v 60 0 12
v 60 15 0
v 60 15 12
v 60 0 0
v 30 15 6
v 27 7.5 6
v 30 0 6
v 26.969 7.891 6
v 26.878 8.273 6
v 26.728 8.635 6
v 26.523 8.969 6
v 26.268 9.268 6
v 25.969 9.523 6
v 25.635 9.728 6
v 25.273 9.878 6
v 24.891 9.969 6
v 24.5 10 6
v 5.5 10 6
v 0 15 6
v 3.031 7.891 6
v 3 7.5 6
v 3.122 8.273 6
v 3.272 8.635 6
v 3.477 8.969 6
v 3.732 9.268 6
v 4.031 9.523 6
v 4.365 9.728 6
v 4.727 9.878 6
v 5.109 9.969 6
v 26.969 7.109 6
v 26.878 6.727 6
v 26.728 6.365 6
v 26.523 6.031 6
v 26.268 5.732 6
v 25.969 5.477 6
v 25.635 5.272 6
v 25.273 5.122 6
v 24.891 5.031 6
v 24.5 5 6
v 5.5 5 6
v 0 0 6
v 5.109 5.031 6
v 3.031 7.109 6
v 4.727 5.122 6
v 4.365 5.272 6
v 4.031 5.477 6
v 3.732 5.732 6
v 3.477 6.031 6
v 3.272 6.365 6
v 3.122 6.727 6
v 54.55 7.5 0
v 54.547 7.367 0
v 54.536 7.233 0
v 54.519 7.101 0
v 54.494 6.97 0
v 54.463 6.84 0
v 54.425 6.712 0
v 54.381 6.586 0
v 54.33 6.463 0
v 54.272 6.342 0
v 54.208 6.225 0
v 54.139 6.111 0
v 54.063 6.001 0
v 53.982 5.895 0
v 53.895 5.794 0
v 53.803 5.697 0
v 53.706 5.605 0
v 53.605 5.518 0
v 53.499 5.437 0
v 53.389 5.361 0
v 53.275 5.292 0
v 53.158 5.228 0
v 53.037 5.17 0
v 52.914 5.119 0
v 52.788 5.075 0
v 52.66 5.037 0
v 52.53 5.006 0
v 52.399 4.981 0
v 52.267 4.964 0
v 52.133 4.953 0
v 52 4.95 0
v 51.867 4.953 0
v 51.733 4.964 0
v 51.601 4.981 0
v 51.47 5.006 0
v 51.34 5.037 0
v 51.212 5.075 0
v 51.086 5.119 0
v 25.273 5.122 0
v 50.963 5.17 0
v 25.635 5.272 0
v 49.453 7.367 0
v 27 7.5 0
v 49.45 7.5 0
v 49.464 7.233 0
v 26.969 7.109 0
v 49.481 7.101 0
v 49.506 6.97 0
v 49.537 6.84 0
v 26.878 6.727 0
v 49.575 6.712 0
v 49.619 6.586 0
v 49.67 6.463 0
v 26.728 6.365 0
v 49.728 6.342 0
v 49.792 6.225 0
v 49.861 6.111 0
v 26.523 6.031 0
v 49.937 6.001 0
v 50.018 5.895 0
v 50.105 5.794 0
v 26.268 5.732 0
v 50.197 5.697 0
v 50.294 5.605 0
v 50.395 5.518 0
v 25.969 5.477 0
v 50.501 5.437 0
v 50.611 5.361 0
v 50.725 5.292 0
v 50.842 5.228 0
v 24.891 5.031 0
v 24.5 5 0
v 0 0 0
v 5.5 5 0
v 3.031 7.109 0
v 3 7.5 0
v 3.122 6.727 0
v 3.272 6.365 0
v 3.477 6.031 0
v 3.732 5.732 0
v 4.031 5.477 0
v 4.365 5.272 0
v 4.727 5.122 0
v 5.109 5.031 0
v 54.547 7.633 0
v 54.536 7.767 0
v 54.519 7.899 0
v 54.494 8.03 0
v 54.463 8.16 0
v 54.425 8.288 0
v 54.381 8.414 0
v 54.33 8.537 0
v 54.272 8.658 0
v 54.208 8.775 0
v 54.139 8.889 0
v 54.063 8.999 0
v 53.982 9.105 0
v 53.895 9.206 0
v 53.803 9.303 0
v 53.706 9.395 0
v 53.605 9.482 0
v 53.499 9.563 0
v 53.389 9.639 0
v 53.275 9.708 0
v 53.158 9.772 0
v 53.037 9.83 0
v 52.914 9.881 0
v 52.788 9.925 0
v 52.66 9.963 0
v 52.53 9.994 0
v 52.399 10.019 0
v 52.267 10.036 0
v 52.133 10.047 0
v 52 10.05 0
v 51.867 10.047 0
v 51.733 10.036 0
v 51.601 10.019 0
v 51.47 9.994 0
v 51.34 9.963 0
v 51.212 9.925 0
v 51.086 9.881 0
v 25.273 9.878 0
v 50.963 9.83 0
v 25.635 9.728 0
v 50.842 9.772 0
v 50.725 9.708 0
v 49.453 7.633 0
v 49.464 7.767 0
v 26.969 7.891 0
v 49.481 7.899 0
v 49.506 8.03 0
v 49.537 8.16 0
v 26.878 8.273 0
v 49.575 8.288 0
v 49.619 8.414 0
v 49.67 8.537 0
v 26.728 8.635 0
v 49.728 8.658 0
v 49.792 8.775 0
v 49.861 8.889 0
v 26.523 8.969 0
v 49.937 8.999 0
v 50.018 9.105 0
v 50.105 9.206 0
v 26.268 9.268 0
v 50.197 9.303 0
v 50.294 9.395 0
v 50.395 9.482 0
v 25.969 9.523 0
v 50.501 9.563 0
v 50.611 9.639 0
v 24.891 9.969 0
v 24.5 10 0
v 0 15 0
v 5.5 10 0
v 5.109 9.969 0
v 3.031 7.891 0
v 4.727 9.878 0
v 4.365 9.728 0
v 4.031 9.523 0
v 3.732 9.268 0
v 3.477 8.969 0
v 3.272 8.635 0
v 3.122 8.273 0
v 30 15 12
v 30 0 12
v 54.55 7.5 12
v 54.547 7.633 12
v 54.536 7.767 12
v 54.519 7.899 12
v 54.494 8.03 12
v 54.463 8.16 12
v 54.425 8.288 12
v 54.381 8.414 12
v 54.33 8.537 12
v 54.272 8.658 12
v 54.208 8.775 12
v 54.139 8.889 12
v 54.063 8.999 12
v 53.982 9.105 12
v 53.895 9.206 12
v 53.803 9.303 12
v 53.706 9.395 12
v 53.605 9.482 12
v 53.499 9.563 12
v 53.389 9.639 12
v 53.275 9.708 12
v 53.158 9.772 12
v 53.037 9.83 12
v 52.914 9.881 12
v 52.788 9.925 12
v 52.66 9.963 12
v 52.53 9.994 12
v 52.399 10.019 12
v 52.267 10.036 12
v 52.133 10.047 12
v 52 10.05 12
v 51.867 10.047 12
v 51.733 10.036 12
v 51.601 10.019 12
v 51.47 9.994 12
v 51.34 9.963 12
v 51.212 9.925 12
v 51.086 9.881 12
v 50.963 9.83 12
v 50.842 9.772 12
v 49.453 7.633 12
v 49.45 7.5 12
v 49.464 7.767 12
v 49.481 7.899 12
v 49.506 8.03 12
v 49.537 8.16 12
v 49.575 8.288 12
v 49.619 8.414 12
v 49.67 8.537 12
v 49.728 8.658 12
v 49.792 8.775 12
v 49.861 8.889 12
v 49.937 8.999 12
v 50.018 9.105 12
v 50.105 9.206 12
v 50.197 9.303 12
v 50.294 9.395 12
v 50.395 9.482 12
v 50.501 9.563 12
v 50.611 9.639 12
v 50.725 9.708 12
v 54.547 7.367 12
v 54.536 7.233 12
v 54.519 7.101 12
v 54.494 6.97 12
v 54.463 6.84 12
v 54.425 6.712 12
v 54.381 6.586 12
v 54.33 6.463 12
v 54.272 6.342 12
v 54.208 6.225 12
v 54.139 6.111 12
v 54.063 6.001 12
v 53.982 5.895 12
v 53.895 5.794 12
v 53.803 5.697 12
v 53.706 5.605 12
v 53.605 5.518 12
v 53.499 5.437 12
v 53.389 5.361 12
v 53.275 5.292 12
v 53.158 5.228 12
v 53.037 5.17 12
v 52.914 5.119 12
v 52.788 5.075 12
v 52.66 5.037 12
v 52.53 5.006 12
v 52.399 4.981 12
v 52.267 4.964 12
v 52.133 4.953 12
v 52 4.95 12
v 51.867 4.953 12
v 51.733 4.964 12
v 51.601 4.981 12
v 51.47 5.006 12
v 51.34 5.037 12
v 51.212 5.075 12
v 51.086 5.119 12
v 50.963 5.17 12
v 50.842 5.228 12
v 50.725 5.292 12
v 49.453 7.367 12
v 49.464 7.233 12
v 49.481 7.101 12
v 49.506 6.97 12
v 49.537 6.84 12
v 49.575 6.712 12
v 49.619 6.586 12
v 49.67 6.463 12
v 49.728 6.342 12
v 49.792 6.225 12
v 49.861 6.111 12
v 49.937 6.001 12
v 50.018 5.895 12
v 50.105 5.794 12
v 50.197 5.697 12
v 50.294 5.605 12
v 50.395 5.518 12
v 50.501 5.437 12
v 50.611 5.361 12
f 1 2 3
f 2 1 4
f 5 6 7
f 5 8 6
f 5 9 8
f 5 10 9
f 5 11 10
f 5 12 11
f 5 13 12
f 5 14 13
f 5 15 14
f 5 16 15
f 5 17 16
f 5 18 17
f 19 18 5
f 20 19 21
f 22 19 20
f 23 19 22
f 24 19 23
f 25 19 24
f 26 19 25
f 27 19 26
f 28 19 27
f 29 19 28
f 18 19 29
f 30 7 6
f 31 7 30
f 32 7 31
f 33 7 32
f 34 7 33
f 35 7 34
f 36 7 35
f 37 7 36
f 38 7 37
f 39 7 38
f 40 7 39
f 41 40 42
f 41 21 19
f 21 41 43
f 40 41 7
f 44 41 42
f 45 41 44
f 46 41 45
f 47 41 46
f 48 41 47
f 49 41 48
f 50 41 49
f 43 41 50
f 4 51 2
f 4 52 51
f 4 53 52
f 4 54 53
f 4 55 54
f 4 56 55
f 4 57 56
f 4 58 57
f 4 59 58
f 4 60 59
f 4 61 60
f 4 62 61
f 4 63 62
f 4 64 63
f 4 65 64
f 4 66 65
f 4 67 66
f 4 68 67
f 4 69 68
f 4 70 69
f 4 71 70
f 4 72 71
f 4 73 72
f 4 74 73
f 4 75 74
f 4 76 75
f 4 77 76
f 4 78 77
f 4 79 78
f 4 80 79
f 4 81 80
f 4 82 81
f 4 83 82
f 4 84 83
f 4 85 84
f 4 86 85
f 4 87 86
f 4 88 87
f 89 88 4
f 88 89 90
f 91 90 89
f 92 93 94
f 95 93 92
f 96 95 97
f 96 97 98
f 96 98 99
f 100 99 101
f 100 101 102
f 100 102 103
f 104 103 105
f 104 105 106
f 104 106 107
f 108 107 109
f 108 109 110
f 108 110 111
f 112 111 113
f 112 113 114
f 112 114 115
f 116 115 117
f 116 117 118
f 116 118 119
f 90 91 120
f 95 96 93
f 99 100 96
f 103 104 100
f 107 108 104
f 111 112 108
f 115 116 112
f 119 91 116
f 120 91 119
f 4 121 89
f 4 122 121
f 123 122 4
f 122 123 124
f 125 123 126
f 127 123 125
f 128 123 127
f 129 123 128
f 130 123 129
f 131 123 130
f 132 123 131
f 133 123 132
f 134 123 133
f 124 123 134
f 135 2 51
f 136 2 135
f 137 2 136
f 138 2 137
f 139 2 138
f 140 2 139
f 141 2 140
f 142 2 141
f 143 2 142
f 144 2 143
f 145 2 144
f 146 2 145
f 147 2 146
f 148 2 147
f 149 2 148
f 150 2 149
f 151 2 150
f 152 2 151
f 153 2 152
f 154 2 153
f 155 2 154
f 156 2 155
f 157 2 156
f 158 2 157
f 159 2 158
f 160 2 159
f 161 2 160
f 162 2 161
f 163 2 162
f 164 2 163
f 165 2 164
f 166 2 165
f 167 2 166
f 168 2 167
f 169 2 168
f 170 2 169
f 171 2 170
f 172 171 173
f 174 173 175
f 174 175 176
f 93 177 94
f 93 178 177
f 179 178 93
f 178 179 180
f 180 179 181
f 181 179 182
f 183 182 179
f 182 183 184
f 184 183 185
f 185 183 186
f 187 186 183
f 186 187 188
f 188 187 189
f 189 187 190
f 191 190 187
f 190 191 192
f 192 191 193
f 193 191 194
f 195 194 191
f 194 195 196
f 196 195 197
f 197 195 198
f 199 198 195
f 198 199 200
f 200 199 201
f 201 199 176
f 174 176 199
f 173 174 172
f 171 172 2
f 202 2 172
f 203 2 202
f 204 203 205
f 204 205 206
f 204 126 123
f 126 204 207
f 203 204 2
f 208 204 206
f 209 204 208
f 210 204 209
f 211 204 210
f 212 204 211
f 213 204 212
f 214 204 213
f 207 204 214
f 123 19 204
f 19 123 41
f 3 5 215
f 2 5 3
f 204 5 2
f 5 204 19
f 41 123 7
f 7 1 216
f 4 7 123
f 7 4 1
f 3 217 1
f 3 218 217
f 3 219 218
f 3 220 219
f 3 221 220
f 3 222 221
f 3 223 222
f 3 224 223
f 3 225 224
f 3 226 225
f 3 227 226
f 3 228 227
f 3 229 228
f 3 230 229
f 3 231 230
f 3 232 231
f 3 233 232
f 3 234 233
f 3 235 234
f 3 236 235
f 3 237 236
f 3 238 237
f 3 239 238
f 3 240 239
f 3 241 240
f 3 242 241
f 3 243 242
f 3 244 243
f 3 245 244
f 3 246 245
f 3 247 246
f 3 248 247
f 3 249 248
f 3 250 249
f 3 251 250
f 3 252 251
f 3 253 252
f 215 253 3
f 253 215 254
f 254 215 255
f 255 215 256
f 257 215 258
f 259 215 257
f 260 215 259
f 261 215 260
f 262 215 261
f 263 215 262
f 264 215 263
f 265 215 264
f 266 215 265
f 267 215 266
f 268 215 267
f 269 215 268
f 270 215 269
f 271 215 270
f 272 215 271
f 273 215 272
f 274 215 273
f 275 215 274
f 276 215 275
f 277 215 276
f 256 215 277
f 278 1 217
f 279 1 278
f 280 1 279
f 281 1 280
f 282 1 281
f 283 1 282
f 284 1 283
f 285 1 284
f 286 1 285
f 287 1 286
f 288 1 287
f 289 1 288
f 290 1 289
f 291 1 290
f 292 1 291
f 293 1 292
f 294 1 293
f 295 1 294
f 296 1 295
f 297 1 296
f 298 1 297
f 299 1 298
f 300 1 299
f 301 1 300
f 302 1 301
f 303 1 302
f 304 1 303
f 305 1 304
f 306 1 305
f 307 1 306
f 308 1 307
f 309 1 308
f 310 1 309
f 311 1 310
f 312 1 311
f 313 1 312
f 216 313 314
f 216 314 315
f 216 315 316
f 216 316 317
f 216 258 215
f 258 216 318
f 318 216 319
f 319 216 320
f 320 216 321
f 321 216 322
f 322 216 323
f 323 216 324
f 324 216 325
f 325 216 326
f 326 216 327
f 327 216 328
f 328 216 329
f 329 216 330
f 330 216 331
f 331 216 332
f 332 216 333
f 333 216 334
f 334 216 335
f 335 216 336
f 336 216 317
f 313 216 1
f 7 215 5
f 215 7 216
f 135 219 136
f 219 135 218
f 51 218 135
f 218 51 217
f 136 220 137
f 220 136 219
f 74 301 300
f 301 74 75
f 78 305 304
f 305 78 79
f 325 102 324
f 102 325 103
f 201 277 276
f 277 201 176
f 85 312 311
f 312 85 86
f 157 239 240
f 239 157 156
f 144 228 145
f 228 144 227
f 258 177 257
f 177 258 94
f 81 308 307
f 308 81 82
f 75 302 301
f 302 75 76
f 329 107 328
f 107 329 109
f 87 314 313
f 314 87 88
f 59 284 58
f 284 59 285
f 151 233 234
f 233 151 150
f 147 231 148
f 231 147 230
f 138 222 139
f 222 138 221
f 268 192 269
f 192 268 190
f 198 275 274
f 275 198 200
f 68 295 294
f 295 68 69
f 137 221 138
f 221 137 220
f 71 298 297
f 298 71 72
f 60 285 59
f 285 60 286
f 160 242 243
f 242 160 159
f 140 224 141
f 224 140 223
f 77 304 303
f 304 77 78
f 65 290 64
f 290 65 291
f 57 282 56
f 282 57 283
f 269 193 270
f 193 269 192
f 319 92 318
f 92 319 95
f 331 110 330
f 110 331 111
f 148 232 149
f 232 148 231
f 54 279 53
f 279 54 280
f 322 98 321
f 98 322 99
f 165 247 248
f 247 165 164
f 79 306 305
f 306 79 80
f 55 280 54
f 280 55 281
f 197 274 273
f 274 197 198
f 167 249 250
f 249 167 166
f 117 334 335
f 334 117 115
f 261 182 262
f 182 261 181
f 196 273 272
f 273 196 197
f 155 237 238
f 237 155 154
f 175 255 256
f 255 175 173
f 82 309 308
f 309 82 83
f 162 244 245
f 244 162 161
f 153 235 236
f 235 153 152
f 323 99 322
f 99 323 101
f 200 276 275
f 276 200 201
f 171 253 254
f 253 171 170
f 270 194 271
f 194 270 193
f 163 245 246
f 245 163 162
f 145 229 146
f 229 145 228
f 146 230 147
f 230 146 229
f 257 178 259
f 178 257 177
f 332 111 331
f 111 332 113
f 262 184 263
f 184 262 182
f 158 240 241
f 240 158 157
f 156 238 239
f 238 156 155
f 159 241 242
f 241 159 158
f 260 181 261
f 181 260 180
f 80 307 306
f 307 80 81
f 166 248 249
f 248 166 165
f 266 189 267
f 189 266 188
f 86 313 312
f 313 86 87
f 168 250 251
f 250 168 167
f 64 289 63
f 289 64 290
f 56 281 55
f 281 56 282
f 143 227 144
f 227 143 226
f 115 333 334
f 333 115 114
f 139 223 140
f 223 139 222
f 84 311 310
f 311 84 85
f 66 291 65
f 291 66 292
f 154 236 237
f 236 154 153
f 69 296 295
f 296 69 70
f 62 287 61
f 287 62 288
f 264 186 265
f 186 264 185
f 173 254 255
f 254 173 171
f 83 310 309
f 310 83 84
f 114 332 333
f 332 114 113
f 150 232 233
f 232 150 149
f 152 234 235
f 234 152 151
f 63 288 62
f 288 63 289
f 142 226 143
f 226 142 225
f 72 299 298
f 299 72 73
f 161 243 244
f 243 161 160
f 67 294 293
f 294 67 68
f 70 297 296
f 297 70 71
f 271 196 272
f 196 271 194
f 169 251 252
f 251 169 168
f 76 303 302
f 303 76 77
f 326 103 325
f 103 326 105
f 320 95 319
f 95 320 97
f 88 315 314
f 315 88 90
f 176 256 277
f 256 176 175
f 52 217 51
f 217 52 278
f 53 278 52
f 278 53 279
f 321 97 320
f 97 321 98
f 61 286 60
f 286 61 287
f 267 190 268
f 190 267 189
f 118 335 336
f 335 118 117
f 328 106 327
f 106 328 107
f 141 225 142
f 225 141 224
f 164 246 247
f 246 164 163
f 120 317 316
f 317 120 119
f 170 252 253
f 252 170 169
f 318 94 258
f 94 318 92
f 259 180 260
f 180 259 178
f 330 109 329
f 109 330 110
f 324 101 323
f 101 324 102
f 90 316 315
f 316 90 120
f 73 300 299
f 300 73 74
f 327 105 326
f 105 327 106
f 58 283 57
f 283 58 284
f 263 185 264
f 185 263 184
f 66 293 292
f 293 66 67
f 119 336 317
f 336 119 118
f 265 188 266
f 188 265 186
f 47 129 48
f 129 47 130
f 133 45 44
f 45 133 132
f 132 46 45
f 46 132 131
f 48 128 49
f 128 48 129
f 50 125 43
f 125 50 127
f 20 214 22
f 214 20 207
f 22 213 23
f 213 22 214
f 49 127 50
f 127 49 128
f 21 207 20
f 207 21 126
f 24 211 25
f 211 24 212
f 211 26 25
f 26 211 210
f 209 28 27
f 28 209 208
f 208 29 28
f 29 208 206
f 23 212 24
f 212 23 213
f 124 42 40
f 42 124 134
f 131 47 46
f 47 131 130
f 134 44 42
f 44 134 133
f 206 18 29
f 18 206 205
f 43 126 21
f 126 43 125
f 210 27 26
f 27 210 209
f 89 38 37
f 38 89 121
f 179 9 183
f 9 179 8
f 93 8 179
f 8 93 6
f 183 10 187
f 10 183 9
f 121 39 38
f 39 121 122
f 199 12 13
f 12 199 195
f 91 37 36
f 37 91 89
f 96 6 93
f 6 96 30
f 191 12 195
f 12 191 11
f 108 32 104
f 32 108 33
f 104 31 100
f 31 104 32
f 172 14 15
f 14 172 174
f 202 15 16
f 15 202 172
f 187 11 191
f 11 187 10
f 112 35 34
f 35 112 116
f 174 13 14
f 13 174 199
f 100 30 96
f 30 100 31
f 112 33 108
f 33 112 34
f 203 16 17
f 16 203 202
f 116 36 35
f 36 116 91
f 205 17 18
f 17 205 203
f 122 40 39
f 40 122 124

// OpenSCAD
//This is an openscad part used as a pulley to connect to the shaft

//render
//lower_flange();
//translate([-h_lip-h_body/2,0,d_shaft+2*t_hub])
//rotate([0,90,0])
//idler_pulley();

tensioner();

//===========Parameters===========

num_frames = 12; //total number of frames to make cutouts for
panel_width = 1.625*25.4;  //size of each panel

//===========Geometry============
clearance = 0.1; //mm - amount to oversize holes so that parts will assemble

d_shaft = .75*25.4; //0.75" shaft diameter in mm
d_mag = 8.1; //  diamete of magnets in mm
h_mag = 2.1; //mm the heigh of the magnets
d_pin = 0.125*25.4; // diameter of pins used to hold shaft to flange
d_flange = 7*25.4; // outer diameter of the flange 
t_flange = 6; //thickness of the flang in mm
t_hub = 6; //thickness of the material around the hub
h_hub = 25; //height of the hub from the surface of the flange
edge_space = 5; //mm from the edge of the flange to the closest part of the frame
d_base = d_shaft+2*t_hub+6;
t_base = 3; //mm thickness of base web
t_panel = 3;//mm how thick each panel is
panel_cut = 3; //mm how deep of a recess to cut for each panel

h_lip = 1.45; //mm height of the lip that keeps the belt in place
h_body = 3.7; //mm height of the body area the belt rides on

t_lip = 0.75; //mm diamater of lip above body
d_cut = 3.2; //mm diameter in bore size 

inner_clear = 10; //mm space between arms
t_arm = 6; //mm thickness of each arm
h_arm = 40; //mm length of each arm
t_base = 8; //mm thickness of the base
depth = 20; //mm how deep the assembly is

ten_width = 15; //mm how wide the tensioner is
bh_width = 5; //mm how wide to make the screw hole
bh_len = 30; //mm how long the bolt holder section should be
ten_dist = 22; //mm distance from the edge of the board to center of shaft
d_spindle = 4.5; //mm diameter of the spindle shaft
extra_len = 8; //mm distance from center of shaft to end of block
h_wood = 6; // mm - thickness of wood
h_block = 6; // mm - thickness of bolt holddown
len_total = bh_len + ten_dist+extra_len;
bh_edge = 3; //mm clearance for bolt hole to edge

fudge = 0.01; //mm - use this value to make sure surfaces aren't coincident
//===========Modules=============
module lower_flange(){
    difference(){
        //Make the core of the flange
        union(){
            //This makes the base of the flange
            //cylinder(r = d_flange/2, h= t_flange, $fn = 360);
            //This makes the hub
            //translate([0,0,t_flange-fudge])
            cylinder(r=d_base,h=t_base,$fn = 120);
            cylinder(r = d_shaft/2+t_hub, h = h_hub+t_flange, $fn = 120);
            //add in a block to mate the disks
            translate([-49/2,-10.1/2,0])
            cube([49,10.1,6+t_base]);
        }
        //Then subtract things from it
        
        //Subtract the hole for the shaft
        translate([0,0,-fudge])
        cylinder(r = d_shaft/2+clearance,h = t_flange+h_hub+2*fudge,$fn = 120);
        
        //cut a pin to register the flange to the shaft
               
        translate([0,0,t_flange+h_hub*.5])
        rotate([90,0,0]) 
        cylinder(r=d_pin/2,h=5*d_shaft+2*t_hub+2*fudge,$fn=20,center=true);
        //subtract the holes for the frames
        for (i=[0:num_frames-1]){
            cord_calc(i);
            mag_holes(i);
            
            
        }
        
 
    }
    
  
    
    
    
    
}
module cord_calc(i){
    theta = 2*3.1415/num_frames;
    r_panel = (d_flange/2-edge_space)*cos(theta/2)-t_panel;
 
    rotate([0,0,i*theta*180/3.1415])
    translate([r_panel,-panel_width/2,t_flange+fudge-panel_cut])
    cube([t_panel+clearance,panel_width+clearance,panel_cut]);
  
}

module mag_holes(i){
    theta = 2*3.1415/num_frames;
    
    rotate([0,0,i*theta*180/3.1415])
    translate([d_flange/2-d_mag/2-edge_space,0,-fudge])
    cylinder(r=d_mag/2+clearance, h=h_mag, $fn = 20);
    
}
module idler_pulley(){
    difference(){
        union(){
        //create the surface of the pulley that the belt rides on
        translate([0,0,h_lip])
        cylinder(r = d_shaft/2+t_hub, h = h_body, $fn = 120);
        //lower lip
        cylinder(r = d_shaft/2+t_hub+t_lip, h = h_lip+fudge, $fn = 120);
        //upper lip
        translate([0,0,h_lip+h_body-fudge])
        cylinder(r = d_shaft/2+t_hub+t_lip, h = h_lip+fudge, $fn = 120);        
    }
        //subtract out center hole
        translate([0,0,-fudge])
        cylinder(r = d_cut/2, h = h_body+2*h_lip+2*fudge,$fn=120);
    
    }
}

module bracket(){
    difference(){
        union(){
            //create the base
            translate([-inner_clear/2,-depth/2,0])
            cube([inner_clear,depth,t_base]);
            //right arm
            translate([inner_clear/2,-depth/2,0])
            cube([t_arm,depth,h_arm]);
            //left arme
            translate([-inner_clear/2-t_arm,-depth/2,0])
            cube([t_arm,depth,h_arm]);        
    }
        //subtract out center hole
        translate([-50,0,d_shaft+2*t_hub])
        rotate([0,90,0])
        cylinder(r = d_cut/2, h = 100,$fn=120);
    
        //subtract out mounting hole
        translate([0,0,-fudge])
        cylinder(r = d_cut/2,h = 100, $fn = 40);
    
    }
    
    
    
}

module tensioner(){
    difference(){
        union(){
            //create the holddown that sets the sizes
            cube([len_total,ten_width,h_block]);
            //add the portion that will mirror the thickness of the wood
            translate([bh_len,0,h_block])
            cube([ten_dist+extra_len,ten_width,h_wood]);    
    }
        //subtract out shaft hole
        translate([bh_len+ten_dist,ten_width/2,-2*h_wood])
        cylinder(r = d_spindle/2+3*clearance, h = 10*h_wood,$fn=120);
    
        //subtract out mounting slot
        //put cylinders on both ends
        //put a box in the center
        translate([bh_width/2+bh_edge,ten_width/2,-2*h_wood])
        cylinder(r = bh_width/2,h = 10*h_wood, $fn = 40);
        //second cylinder
        translate([bh_len-bh_width/2-bh_edge,ten_width/2,-2*h_wood])
        cylinder(r = bh_width/2,h = 10*h_wood, $fn = 40);
        //box
        translate([bh_width/2+bh_edge,ten_width/2-bh_width/2,-2*h_wood])
        cube([bh_len-2*bh_edge-bh_width, bh_width, 10*h_wood]);
    
    }
    
    
    
}
